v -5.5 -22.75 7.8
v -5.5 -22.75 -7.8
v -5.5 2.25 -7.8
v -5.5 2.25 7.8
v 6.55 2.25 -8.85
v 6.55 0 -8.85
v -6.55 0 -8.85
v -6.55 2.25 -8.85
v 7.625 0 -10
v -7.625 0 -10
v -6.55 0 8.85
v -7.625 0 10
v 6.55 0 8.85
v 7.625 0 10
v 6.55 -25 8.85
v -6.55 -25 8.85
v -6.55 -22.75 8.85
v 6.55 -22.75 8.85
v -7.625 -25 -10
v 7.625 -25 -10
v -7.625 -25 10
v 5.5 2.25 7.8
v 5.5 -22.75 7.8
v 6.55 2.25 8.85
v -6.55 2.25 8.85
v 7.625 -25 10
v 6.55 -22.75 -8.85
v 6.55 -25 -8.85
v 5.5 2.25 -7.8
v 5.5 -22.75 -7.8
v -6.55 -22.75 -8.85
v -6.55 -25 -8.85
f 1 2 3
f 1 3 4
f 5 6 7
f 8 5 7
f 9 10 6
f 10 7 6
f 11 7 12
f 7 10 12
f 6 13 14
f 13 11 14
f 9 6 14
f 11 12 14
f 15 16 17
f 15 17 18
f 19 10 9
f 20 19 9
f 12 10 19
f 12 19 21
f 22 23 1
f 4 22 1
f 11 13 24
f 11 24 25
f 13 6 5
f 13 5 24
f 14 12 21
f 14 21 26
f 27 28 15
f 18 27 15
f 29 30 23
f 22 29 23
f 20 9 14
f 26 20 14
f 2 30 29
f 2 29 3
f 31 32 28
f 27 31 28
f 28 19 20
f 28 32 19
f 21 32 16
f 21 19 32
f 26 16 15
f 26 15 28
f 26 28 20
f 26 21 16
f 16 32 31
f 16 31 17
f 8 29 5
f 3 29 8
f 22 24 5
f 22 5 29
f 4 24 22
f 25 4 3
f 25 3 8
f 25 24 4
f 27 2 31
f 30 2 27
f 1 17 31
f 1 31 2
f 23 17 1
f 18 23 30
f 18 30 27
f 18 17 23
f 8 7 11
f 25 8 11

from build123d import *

# Parameters (mm, degrees)
F0_W     = 15.25
F0_H     = 20
F0_W_2   = 11
F0_H_2   = 15.6
F1_DEPTH = 25
F2_W     = 13.1
F2_H     = 17.7
F2_W_2   = 11
F2_H_2   = 15.6
F3_DEPTH = 2.25
F4_W     = 13.1
F4_H     = 17.7
F4_W_2   = 11
F4_H_2   = 15.6
F5_DEPTH = 2.25


with BuildPart() as f1:
    # F0 (on Front) → F1 (new body)
    with BuildSketch(Plane.XZ):
        Rectangle(F0_W, F0_H)
        Rectangle(F0_W_2, F0_H_2, mode=Mode.SUBTRACT)
    extrude(amount=F1_DEPTH)

    # F2 (on face) → F3 (join)
    with BuildSketch(Plane(origin=(0, 0, 0), x_dir=(-1, 0, 0), z_dir=(0, 1, 0))):
        Rectangle(F2_W, F2_H)
        Rectangle(F2_W_2, F2_H_2, mode=Mode.SUBTRACT)
    extrude(amount=F3_DEPTH)

    # F4 (on face) → F5 (cut)
    with BuildSketch(Plane.XZ.offset(25)):
        Rectangle(F4_W, F4_H)
        Rectangle(F4_W_2, F4_H_2, mode=Mode.SUBTRACT)
    extrude(amount=-F5_DEPTH, mode=Mode.SUBTRACT)


solid = f1.part
